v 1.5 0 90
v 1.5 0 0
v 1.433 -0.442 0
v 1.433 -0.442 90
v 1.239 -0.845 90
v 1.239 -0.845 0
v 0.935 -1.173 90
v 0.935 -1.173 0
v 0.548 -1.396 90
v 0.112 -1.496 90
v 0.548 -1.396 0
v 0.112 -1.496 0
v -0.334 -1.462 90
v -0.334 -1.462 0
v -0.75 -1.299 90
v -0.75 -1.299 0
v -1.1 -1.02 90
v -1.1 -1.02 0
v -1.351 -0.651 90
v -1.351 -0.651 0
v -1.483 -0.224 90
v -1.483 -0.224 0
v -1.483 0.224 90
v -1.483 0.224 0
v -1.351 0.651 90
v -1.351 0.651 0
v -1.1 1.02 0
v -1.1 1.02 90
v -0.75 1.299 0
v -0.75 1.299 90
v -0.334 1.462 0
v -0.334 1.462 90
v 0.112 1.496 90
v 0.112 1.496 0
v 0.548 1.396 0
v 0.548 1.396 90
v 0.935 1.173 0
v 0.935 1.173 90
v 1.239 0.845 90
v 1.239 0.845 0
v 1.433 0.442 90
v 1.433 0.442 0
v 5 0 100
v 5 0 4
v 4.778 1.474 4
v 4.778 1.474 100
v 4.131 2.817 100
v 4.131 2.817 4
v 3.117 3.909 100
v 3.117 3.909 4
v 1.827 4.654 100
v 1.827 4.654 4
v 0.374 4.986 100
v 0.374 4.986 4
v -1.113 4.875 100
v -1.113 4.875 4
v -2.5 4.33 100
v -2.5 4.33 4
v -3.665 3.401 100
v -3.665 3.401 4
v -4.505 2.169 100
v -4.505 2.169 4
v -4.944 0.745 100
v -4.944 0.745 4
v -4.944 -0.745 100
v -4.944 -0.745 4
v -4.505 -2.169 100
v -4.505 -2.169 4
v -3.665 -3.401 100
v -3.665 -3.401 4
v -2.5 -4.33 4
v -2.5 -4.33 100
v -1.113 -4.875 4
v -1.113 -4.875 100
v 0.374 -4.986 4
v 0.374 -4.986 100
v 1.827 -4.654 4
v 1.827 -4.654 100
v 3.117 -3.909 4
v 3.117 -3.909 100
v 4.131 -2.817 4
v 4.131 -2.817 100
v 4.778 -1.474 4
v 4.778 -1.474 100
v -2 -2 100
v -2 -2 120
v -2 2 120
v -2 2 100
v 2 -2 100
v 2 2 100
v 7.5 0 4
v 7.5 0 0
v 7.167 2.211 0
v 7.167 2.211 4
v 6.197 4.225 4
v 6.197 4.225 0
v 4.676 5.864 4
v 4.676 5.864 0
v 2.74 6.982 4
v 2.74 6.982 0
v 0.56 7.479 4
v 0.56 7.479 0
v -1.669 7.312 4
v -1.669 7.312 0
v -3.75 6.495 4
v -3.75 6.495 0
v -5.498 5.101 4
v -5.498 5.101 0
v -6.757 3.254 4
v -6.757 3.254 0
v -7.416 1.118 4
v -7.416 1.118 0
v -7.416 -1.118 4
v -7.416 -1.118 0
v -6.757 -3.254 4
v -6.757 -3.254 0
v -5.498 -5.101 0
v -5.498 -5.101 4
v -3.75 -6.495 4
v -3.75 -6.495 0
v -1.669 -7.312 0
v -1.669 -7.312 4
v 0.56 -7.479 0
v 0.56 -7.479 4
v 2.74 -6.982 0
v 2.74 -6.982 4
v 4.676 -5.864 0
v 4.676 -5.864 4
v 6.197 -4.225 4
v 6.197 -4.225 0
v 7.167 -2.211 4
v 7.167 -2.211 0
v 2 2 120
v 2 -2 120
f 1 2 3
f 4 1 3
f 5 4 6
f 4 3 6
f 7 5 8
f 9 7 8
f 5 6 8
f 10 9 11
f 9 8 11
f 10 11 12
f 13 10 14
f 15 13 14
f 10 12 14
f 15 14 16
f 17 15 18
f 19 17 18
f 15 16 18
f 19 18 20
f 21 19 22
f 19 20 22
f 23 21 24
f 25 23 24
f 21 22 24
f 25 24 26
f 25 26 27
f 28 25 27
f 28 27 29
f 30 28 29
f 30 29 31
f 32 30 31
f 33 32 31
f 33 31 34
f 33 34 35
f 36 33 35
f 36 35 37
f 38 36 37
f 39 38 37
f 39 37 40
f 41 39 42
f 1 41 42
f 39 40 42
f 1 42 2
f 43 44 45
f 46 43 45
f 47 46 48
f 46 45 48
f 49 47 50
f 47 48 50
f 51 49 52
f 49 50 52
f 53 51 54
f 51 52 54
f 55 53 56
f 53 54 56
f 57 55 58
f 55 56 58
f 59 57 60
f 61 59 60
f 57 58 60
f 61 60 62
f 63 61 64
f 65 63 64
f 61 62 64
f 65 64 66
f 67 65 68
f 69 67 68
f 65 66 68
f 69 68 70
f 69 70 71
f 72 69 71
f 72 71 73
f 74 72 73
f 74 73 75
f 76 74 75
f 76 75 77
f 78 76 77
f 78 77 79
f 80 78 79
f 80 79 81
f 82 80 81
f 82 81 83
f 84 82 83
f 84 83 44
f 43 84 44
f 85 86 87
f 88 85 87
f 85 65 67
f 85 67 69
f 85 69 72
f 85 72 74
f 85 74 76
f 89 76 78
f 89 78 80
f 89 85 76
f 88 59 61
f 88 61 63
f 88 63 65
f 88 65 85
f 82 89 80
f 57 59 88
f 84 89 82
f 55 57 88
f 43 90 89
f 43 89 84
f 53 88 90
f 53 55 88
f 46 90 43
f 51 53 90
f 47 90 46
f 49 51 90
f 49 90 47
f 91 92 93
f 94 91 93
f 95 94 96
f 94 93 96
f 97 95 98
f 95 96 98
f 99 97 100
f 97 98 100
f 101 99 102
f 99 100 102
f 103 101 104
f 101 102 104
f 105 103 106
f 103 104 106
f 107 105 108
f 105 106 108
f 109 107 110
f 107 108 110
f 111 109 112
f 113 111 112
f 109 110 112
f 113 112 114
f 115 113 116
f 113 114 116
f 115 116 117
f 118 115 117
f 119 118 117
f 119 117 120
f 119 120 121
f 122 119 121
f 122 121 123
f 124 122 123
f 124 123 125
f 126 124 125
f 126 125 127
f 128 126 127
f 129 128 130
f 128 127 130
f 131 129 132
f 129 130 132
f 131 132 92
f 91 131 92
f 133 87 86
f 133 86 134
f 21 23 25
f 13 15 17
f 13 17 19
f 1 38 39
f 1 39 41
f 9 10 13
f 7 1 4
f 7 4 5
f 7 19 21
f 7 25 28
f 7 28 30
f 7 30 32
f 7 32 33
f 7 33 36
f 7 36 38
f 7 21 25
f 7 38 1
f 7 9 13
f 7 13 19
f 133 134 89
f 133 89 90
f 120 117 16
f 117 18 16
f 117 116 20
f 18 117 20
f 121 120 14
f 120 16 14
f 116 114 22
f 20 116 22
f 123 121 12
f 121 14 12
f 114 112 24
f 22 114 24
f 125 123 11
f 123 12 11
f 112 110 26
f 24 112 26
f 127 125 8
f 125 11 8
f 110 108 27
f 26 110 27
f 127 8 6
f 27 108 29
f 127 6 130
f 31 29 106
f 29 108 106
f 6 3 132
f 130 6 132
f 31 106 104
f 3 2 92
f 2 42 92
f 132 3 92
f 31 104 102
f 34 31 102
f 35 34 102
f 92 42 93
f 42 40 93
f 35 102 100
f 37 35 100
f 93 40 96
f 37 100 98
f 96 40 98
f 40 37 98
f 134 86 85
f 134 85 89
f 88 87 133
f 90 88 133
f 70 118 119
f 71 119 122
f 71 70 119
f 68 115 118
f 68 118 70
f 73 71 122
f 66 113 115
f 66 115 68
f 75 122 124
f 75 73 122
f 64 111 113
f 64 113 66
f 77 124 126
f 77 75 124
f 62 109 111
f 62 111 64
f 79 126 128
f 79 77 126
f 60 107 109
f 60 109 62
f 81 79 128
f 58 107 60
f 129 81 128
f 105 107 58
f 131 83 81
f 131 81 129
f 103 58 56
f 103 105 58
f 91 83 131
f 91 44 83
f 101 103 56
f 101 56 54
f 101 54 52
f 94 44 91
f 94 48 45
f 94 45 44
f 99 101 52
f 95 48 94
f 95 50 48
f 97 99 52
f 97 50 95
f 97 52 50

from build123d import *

# Parameters (mm, degrees)
F0_R     = 7.5
F1_DEPTH = 4
F2_R     = 5
F3_DEPTH = 100
F4_W     = 4
F4_H     = 4
F5_DEPTH = 20
F6_R     = 1.5
F7_DEPTH = 90


with BuildPart() as f1:
    # F0 (on Top) → F1 (new body)
    with BuildSketch(Plane.XY):
        Circle(F0_R)
    extrude(amount=F1_DEPTH)

    # F2 (on Top) → F3 (join)
    with BuildSketch(Plane.XY):
        Circle(F2_R)
    extrude(amount=F3_DEPTH)

    # F4 (on face) → F5 (join)
    with BuildSketch(Plane.XY.offset(100)):
        Rectangle(F4_W, F4_H)
    extrude(amount=F5_DEPTH)

    # F6 (on face) → F7 (cut)
    with BuildSketch(Plane(origin=(0, 0, 0), x_dir=(1, 0, 0), z_dir=(0, 0, -1))):
        Circle(F6_R)
    extrude(amount=-F7_DEPTH, mode=Mode.SUBTRACT)


solid = f1.part
